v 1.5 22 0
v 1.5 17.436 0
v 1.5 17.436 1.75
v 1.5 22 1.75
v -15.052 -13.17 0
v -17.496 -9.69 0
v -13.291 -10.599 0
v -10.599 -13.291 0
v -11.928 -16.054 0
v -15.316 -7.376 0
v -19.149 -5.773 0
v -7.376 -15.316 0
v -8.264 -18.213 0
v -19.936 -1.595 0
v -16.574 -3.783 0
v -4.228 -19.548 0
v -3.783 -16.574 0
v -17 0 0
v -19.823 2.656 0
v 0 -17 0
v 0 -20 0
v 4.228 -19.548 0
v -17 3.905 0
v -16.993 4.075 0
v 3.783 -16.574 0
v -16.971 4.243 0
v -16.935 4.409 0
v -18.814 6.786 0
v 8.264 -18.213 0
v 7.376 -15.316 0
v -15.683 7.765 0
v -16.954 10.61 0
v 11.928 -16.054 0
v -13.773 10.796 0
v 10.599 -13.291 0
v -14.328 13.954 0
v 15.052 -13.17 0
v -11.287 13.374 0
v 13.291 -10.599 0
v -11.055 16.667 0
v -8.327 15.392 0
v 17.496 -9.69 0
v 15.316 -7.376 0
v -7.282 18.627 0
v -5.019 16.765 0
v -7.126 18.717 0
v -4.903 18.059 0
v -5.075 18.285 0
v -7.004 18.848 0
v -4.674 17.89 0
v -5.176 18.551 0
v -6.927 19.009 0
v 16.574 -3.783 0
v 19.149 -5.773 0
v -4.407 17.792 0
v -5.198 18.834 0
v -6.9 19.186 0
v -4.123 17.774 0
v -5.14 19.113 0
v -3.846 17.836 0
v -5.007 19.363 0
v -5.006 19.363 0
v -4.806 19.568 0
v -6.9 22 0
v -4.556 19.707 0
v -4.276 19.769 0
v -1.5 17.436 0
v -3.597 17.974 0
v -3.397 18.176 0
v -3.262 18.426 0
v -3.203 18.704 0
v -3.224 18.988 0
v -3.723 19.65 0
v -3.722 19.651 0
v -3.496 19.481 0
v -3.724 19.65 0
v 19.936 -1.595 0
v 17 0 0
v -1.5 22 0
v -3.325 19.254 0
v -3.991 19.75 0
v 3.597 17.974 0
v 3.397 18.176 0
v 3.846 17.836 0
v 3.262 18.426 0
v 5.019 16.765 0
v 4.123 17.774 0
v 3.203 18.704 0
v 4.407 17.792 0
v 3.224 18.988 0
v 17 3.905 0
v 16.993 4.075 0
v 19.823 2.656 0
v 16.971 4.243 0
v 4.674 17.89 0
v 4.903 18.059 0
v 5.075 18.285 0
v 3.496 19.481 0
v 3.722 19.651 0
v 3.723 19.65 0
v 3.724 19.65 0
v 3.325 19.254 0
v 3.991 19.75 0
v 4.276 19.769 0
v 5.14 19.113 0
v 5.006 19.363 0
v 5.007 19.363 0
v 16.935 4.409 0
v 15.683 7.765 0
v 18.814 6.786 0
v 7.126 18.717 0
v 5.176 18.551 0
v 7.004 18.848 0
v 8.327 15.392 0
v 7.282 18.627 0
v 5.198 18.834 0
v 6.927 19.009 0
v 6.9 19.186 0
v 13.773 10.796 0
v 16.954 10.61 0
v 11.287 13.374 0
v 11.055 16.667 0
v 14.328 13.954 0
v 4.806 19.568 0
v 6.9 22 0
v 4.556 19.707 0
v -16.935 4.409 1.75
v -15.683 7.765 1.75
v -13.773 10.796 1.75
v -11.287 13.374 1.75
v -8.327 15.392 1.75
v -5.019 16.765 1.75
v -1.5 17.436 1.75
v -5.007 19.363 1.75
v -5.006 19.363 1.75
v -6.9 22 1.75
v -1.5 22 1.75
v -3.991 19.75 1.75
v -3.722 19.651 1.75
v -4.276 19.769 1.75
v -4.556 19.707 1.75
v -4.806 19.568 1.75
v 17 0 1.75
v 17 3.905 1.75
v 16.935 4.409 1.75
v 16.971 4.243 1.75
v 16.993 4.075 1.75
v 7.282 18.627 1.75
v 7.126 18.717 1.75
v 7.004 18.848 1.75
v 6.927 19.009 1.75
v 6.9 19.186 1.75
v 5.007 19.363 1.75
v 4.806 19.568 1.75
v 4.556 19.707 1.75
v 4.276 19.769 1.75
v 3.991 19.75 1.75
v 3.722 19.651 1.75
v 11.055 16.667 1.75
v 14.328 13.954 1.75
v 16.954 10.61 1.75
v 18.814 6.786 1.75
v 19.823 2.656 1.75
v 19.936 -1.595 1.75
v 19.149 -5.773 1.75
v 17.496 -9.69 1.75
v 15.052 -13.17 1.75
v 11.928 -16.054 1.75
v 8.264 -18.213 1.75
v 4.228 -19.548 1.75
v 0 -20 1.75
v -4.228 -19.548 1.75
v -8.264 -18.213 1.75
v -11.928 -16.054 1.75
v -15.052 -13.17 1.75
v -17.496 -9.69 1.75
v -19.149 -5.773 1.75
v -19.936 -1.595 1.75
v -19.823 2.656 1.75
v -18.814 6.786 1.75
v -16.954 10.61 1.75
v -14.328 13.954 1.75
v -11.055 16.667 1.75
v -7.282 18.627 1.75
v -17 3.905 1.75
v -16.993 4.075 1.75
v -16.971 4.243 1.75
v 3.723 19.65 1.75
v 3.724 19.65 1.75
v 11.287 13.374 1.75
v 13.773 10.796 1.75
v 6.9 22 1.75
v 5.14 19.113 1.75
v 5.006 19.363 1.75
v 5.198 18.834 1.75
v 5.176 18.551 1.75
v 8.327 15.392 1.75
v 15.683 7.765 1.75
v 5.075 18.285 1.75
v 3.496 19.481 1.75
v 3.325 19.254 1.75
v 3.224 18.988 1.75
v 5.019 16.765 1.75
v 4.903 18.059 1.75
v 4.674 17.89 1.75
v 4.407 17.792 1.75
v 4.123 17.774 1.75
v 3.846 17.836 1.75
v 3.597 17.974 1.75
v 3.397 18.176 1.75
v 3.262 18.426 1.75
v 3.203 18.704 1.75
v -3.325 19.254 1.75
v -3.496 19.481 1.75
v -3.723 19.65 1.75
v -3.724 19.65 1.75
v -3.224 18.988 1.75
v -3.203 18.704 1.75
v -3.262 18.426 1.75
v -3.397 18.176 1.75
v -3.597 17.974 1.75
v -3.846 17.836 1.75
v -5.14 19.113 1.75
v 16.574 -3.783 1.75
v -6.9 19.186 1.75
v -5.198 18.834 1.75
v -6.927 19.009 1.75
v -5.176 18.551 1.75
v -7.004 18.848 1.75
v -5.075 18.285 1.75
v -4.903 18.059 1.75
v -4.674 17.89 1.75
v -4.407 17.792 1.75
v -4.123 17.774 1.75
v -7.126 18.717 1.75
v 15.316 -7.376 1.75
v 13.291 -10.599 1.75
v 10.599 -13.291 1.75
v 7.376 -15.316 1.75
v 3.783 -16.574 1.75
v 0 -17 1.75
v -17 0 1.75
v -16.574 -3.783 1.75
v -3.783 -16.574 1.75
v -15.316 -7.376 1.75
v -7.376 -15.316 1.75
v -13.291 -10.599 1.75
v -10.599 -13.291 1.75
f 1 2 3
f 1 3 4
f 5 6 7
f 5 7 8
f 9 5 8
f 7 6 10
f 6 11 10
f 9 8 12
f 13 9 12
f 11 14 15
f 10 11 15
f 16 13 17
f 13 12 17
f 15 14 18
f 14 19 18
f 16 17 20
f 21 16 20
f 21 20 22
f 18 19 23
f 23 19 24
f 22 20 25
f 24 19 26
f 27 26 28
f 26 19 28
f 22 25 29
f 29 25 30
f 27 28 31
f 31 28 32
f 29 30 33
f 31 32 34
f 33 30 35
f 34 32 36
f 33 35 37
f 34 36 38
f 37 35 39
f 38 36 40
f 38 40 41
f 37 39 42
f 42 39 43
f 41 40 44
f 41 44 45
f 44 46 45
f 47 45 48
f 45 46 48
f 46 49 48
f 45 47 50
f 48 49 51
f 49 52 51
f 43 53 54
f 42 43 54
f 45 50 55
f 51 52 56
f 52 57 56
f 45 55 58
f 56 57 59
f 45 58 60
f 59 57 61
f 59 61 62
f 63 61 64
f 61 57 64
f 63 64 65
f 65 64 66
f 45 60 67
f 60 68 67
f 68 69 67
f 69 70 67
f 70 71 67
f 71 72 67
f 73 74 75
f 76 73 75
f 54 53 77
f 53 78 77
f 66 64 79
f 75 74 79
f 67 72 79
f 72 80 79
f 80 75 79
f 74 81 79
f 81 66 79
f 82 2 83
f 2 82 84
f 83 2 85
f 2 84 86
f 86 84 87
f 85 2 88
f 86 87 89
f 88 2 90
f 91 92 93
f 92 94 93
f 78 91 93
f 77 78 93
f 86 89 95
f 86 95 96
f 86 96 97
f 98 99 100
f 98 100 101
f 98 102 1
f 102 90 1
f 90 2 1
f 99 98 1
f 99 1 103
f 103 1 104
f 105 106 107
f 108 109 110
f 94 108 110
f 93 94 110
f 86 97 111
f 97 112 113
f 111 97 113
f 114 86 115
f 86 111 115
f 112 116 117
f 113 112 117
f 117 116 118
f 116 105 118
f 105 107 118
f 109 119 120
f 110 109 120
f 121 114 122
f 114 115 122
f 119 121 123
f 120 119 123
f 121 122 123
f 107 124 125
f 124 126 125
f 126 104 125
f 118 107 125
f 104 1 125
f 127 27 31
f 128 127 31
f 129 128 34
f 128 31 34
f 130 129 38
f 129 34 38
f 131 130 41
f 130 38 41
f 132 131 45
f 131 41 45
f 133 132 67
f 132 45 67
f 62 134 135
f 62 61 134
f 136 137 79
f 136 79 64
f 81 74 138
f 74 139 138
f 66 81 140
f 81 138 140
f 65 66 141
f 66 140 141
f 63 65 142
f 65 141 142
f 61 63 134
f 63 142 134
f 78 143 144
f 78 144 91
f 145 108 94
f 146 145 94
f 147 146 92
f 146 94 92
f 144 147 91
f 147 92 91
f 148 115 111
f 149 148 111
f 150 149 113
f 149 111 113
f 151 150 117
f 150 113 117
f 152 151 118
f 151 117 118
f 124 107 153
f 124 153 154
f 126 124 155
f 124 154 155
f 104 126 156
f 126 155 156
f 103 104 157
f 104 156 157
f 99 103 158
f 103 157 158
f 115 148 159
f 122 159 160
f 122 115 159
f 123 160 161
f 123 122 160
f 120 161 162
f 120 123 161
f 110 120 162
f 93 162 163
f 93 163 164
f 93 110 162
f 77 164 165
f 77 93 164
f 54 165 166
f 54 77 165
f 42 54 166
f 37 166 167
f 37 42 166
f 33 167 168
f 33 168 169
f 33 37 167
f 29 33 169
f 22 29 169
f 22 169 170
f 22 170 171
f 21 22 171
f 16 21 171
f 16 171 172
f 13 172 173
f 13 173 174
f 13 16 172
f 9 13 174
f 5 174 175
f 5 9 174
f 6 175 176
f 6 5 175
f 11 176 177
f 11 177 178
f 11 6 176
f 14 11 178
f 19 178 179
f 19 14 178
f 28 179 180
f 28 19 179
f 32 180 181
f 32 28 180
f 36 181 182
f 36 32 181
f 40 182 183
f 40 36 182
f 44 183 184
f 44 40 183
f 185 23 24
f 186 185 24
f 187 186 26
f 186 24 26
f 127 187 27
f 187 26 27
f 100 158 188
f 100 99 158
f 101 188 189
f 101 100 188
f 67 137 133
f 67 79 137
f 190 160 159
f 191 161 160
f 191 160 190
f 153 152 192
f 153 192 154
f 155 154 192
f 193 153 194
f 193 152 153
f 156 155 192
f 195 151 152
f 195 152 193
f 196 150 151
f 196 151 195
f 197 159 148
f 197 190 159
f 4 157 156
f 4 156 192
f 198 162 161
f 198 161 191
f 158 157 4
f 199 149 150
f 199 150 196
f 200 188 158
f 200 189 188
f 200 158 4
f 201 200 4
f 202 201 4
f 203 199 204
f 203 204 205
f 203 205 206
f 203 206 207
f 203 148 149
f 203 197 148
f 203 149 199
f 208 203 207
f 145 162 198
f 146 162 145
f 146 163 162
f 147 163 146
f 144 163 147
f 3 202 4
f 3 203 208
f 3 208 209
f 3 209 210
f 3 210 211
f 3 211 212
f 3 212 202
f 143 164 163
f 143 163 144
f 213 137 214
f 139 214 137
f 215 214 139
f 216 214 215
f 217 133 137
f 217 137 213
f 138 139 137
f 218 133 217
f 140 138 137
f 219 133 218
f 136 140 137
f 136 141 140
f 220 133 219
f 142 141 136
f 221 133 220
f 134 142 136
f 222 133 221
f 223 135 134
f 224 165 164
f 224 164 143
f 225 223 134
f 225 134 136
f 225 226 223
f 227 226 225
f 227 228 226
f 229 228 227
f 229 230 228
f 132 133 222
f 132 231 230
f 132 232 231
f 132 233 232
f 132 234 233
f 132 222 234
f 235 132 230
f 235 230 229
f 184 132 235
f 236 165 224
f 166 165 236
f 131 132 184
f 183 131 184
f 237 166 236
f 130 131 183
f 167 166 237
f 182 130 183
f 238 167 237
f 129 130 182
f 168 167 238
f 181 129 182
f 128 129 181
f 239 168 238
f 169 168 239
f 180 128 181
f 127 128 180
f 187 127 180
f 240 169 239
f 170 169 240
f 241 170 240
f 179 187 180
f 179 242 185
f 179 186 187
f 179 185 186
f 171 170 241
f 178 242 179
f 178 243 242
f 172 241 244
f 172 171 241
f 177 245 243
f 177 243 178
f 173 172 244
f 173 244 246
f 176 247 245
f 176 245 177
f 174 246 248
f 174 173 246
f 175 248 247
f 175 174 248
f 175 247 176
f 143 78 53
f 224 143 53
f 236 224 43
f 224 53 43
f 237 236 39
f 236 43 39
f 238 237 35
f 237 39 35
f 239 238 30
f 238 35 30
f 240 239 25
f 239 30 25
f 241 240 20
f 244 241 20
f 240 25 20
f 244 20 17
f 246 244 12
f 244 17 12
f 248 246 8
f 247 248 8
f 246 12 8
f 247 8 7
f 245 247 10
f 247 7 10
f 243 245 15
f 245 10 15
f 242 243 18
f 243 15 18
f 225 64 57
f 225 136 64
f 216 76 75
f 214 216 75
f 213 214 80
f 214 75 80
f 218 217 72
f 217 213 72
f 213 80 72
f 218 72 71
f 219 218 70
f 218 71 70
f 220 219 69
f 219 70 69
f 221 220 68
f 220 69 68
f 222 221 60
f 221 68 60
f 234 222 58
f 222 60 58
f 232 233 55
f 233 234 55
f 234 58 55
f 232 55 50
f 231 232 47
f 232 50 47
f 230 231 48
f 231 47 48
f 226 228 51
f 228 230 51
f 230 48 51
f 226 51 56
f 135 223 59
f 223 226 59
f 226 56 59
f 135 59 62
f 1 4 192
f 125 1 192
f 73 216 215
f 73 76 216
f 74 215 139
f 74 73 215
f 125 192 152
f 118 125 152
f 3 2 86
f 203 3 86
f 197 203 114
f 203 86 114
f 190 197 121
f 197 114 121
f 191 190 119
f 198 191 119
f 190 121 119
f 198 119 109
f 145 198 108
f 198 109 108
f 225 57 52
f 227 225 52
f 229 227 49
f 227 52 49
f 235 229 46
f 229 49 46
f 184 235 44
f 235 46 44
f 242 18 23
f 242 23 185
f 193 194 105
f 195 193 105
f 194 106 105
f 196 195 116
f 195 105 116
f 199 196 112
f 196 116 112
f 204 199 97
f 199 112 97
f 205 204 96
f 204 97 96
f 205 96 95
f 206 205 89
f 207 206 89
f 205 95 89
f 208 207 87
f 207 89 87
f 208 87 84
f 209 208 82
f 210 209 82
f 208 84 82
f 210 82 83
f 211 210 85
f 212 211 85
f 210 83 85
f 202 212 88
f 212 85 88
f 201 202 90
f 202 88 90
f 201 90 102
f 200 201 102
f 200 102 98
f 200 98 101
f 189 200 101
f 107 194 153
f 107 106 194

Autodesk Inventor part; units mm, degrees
ref_plane "YZ Plane" through (0, 0, 0) normal (1, 0, 0) x (0, 1, 0)
ref_plane "XZ Plane" through (0, 0, 0) normal (0, 1, 0) x (-1, 0, 0)
ref_plane "XY Plane" through (0, 0, 0) normal (0, 0, 1) x (1, 0, 0)
sketch "Sketch1" plane through (0, 0, 0) normal (0, 0, 1) x (1, 0, 0)
  circle A0 centre (0, 0) radius 17
  circle A1 centre (0, 0) radius 20
  line L0 (-20, 0) -> (20, 0)
  line L1 (0, 0) -> (0, 20.9298)
  line L2 (0, 20.9298) -> (1.5, 20.9298)
  line L3 (1.5, 20.9298) -> (-1.5, 20.9298)
  line L4 (-1.5, 20.9298) -> (-1.5, 15.3128)
  line L5 (-1.5, 15.3128) -> (1.5, 15.3128)
  line L6 (1.5, 15.3128) -> (1.5, 20.9298)
  line L7 (-20, 0) -> (20, 0)
  point P0 (1.5, 19.9437)
  point P1 (1.5, 16.9337)
  point P2 (-1.5, 16.9337)
  point P3 (-1.5, 19.9437)
  dimension "d0" = 34
  dimension "d1" = 40
  dimension "d2" = 1.5
  dimension "d3" = 3
extrude "Extrusion1" add sketch "Sketch1" along normal blind 1.75 contours L0 A1 A0 | A0 L6 A1 L0 | L0 A1 L4 A0
sketch "Sketch2" plane through (0, 0, 1.75) normal (0, 0, 1) x (1, 0, 0)
  arc A0 (-1.5, 19.9437) -> (1.5, 19.9437) centre (0, 0) ccw projected
  line L0 (0, -20) -> (0, 22)
  line L1 (1.5, 22) -> (6.9, 22)
  line L2 (6.9, 22) -> (6.9, 18.7721)
  line L3 (1.5, 22) -> (1.5, 19.9437)
  arc A1 (-1.5, 19.9437) -> (1.5, 19.9437) centre (0, 0) ccw
  line L4 (-1.5, 22) -> (-6.9, 22)
  line L5 (-6.9, 22) -> (-6.9, 18.7721)
  line L6 (-1.5, 22) -> (-1.5, 19.9437)
  circle A2 centre (-4.2, 18.7721) radius 1
  circle A3 centre (4.2, 18.7721) radius 1
  point P0 (3.7223, 19.6506)
  point P1 (5.0065, 19.3632)
  point P2 (-5.0065, 19.3632)
  point P3 (-3.7223, 19.6506)
  dimension "d7" = 5.4
  dimension "d8" = 2
  dimension "d9" = 2
extrude "Extrusion2" add sketch "Sketch2" against normal blind 1.75 contours A0 A2 L5 L4 L6 | A0 A3 L3 L1 L2
sketch "Sketch3" plane through (0, 0, 0) normal (0, 0, -1) x (-1, 0, 0)
  circle A0 centre (-4.2004, 18.7708) radius 1
  line L0 (0, 22.648) -> (0, 15.9884)
  circle A1 centre (4.2004, 18.7708) radius 1
  point P0 (0, 0)
  dimension "d12" = 2
extrude "Extrusion3" cut sketch "Sketch3" against normal blind 10
fillet "Fillet1" radius 0.6 2 edges at (6.9, 18.7721, 0.875) (-6.9, 18.7721, 0.875)
sketch "Sketch4" plane through (0, 0, 0) normal (0, 0, -1) x (-1, 0, 0)
  circle A0 centre (0, 0) radius 17.5
  line L0 (-17.5, 0) -> (17.5, 0)
  circle A1 centre (0, 0) radius 17
  point P0 (-17, 0)
  point P1 (17, 0)
  dimension "d16" = 35
extrude "Extrusion4" cut sketch "Sketch4" against normal blind 10 contours L0 A1 A0 picked at (-7.3917, 15.5534)
sketch "Sketch5" plane through (17, 0, 0) normal (0, 1, 0) x (1, 0, 0)
  line L0 (0.5, -1.75) -> (0, -1.75) projected
  line L1 (0, 0) -> (0.5, 0) projected
  line L2 (0.5, -1.75) -> (0, -1.75)
  line L3 (0, -1.75) -> (0, 0)
  line L4 (0, 0) -> (0.5, 0)
  line L5 (0.5, 0) -> (0.5, -1.75)
  point P0 (-17, 0)
  point P1 (0, -1.75)
extrude "Extrusion5" add sketch "Sketch5" along normal blind 5
fillet "Fillet2" radius 2 1 edges at (17, 4.1533, 0.875)
sketch "Sketch6" plane through (17, 0, 0) normal (-1, 0, 0) x (0, 0, 1)
  point P0 (0, 0)
mirror "Mirror1" about plane through (0, 0, 0) normal (1, 0, 0) of "Extrusion5"
fillet "Fillet3" radius 2 1 edges at (-17, 4.1533, 0.875)
properties part number "cockring"
